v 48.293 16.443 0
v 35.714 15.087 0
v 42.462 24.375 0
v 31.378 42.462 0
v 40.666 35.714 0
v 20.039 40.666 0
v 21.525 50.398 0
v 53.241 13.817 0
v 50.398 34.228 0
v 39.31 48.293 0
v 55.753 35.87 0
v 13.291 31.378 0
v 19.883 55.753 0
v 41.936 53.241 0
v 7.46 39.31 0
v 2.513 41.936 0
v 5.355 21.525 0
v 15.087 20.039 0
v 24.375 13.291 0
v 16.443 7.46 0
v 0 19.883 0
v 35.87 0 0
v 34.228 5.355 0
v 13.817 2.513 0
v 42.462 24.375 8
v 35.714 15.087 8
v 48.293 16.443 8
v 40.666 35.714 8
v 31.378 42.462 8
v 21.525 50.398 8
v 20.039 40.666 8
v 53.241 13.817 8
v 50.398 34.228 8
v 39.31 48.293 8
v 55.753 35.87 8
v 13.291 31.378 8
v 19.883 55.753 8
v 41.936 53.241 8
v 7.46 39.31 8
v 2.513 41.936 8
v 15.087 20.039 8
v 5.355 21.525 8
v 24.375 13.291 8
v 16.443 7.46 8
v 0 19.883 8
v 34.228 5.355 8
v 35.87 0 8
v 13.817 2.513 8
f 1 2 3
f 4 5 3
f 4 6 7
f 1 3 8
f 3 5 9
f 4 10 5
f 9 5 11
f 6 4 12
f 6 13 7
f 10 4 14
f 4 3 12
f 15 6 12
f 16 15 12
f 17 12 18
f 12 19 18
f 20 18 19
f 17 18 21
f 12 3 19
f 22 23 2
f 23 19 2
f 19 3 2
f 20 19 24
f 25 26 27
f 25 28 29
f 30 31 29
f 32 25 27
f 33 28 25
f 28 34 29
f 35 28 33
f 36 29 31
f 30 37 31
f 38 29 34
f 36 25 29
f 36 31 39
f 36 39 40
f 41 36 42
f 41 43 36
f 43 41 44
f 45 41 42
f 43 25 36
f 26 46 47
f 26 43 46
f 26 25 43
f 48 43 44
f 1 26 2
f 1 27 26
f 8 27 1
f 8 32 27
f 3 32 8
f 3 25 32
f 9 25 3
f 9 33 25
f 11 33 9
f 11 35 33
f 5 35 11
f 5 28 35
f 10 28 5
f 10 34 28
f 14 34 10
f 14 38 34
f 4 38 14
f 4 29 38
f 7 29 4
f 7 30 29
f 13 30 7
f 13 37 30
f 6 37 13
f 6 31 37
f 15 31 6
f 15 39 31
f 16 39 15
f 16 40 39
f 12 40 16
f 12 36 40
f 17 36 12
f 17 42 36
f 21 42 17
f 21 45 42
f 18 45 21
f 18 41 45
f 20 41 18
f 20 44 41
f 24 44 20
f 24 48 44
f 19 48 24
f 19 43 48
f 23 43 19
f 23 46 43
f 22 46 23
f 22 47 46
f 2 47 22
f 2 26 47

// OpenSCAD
$fn = 32;

// ----------------------------------------------------------------------
// Fan rotor section: 8 blades, 15 mm hub radius, 14 mm blades
// ----------------------------------------------------------------------

// --- parameters (mm) ---
profile_height = 8;       // extrusion height
profile_points = 24;      // points of the closed outline

profile = [[42.462, 24.375], [50.398, 34.228], [55.753, 35.87], [40.666, 35.714], [39.31, 48.293], [41.936, 53.241], [31.378, 42.462], [21.525, 50.398], [19.883, 55.753], [20.039, 40.666], [7.46, 39.31], [2.513, 41.936], [13.291, 31.378], [5.355, 21.525], [0, 19.883], [15.087, 20.039], [16.443, 7.46], [13.817, 2.513], [24.375, 13.291], [34.228, 5.355], [35.87, 0], [35.714, 15.087], [48.293, 16.443], [53.241, 13.817]];  // single closed polygon, 24 points, counter clockwise

// --- the one profile operation ---
linear_extrude(height = profile_height) polygon(points = profile);
